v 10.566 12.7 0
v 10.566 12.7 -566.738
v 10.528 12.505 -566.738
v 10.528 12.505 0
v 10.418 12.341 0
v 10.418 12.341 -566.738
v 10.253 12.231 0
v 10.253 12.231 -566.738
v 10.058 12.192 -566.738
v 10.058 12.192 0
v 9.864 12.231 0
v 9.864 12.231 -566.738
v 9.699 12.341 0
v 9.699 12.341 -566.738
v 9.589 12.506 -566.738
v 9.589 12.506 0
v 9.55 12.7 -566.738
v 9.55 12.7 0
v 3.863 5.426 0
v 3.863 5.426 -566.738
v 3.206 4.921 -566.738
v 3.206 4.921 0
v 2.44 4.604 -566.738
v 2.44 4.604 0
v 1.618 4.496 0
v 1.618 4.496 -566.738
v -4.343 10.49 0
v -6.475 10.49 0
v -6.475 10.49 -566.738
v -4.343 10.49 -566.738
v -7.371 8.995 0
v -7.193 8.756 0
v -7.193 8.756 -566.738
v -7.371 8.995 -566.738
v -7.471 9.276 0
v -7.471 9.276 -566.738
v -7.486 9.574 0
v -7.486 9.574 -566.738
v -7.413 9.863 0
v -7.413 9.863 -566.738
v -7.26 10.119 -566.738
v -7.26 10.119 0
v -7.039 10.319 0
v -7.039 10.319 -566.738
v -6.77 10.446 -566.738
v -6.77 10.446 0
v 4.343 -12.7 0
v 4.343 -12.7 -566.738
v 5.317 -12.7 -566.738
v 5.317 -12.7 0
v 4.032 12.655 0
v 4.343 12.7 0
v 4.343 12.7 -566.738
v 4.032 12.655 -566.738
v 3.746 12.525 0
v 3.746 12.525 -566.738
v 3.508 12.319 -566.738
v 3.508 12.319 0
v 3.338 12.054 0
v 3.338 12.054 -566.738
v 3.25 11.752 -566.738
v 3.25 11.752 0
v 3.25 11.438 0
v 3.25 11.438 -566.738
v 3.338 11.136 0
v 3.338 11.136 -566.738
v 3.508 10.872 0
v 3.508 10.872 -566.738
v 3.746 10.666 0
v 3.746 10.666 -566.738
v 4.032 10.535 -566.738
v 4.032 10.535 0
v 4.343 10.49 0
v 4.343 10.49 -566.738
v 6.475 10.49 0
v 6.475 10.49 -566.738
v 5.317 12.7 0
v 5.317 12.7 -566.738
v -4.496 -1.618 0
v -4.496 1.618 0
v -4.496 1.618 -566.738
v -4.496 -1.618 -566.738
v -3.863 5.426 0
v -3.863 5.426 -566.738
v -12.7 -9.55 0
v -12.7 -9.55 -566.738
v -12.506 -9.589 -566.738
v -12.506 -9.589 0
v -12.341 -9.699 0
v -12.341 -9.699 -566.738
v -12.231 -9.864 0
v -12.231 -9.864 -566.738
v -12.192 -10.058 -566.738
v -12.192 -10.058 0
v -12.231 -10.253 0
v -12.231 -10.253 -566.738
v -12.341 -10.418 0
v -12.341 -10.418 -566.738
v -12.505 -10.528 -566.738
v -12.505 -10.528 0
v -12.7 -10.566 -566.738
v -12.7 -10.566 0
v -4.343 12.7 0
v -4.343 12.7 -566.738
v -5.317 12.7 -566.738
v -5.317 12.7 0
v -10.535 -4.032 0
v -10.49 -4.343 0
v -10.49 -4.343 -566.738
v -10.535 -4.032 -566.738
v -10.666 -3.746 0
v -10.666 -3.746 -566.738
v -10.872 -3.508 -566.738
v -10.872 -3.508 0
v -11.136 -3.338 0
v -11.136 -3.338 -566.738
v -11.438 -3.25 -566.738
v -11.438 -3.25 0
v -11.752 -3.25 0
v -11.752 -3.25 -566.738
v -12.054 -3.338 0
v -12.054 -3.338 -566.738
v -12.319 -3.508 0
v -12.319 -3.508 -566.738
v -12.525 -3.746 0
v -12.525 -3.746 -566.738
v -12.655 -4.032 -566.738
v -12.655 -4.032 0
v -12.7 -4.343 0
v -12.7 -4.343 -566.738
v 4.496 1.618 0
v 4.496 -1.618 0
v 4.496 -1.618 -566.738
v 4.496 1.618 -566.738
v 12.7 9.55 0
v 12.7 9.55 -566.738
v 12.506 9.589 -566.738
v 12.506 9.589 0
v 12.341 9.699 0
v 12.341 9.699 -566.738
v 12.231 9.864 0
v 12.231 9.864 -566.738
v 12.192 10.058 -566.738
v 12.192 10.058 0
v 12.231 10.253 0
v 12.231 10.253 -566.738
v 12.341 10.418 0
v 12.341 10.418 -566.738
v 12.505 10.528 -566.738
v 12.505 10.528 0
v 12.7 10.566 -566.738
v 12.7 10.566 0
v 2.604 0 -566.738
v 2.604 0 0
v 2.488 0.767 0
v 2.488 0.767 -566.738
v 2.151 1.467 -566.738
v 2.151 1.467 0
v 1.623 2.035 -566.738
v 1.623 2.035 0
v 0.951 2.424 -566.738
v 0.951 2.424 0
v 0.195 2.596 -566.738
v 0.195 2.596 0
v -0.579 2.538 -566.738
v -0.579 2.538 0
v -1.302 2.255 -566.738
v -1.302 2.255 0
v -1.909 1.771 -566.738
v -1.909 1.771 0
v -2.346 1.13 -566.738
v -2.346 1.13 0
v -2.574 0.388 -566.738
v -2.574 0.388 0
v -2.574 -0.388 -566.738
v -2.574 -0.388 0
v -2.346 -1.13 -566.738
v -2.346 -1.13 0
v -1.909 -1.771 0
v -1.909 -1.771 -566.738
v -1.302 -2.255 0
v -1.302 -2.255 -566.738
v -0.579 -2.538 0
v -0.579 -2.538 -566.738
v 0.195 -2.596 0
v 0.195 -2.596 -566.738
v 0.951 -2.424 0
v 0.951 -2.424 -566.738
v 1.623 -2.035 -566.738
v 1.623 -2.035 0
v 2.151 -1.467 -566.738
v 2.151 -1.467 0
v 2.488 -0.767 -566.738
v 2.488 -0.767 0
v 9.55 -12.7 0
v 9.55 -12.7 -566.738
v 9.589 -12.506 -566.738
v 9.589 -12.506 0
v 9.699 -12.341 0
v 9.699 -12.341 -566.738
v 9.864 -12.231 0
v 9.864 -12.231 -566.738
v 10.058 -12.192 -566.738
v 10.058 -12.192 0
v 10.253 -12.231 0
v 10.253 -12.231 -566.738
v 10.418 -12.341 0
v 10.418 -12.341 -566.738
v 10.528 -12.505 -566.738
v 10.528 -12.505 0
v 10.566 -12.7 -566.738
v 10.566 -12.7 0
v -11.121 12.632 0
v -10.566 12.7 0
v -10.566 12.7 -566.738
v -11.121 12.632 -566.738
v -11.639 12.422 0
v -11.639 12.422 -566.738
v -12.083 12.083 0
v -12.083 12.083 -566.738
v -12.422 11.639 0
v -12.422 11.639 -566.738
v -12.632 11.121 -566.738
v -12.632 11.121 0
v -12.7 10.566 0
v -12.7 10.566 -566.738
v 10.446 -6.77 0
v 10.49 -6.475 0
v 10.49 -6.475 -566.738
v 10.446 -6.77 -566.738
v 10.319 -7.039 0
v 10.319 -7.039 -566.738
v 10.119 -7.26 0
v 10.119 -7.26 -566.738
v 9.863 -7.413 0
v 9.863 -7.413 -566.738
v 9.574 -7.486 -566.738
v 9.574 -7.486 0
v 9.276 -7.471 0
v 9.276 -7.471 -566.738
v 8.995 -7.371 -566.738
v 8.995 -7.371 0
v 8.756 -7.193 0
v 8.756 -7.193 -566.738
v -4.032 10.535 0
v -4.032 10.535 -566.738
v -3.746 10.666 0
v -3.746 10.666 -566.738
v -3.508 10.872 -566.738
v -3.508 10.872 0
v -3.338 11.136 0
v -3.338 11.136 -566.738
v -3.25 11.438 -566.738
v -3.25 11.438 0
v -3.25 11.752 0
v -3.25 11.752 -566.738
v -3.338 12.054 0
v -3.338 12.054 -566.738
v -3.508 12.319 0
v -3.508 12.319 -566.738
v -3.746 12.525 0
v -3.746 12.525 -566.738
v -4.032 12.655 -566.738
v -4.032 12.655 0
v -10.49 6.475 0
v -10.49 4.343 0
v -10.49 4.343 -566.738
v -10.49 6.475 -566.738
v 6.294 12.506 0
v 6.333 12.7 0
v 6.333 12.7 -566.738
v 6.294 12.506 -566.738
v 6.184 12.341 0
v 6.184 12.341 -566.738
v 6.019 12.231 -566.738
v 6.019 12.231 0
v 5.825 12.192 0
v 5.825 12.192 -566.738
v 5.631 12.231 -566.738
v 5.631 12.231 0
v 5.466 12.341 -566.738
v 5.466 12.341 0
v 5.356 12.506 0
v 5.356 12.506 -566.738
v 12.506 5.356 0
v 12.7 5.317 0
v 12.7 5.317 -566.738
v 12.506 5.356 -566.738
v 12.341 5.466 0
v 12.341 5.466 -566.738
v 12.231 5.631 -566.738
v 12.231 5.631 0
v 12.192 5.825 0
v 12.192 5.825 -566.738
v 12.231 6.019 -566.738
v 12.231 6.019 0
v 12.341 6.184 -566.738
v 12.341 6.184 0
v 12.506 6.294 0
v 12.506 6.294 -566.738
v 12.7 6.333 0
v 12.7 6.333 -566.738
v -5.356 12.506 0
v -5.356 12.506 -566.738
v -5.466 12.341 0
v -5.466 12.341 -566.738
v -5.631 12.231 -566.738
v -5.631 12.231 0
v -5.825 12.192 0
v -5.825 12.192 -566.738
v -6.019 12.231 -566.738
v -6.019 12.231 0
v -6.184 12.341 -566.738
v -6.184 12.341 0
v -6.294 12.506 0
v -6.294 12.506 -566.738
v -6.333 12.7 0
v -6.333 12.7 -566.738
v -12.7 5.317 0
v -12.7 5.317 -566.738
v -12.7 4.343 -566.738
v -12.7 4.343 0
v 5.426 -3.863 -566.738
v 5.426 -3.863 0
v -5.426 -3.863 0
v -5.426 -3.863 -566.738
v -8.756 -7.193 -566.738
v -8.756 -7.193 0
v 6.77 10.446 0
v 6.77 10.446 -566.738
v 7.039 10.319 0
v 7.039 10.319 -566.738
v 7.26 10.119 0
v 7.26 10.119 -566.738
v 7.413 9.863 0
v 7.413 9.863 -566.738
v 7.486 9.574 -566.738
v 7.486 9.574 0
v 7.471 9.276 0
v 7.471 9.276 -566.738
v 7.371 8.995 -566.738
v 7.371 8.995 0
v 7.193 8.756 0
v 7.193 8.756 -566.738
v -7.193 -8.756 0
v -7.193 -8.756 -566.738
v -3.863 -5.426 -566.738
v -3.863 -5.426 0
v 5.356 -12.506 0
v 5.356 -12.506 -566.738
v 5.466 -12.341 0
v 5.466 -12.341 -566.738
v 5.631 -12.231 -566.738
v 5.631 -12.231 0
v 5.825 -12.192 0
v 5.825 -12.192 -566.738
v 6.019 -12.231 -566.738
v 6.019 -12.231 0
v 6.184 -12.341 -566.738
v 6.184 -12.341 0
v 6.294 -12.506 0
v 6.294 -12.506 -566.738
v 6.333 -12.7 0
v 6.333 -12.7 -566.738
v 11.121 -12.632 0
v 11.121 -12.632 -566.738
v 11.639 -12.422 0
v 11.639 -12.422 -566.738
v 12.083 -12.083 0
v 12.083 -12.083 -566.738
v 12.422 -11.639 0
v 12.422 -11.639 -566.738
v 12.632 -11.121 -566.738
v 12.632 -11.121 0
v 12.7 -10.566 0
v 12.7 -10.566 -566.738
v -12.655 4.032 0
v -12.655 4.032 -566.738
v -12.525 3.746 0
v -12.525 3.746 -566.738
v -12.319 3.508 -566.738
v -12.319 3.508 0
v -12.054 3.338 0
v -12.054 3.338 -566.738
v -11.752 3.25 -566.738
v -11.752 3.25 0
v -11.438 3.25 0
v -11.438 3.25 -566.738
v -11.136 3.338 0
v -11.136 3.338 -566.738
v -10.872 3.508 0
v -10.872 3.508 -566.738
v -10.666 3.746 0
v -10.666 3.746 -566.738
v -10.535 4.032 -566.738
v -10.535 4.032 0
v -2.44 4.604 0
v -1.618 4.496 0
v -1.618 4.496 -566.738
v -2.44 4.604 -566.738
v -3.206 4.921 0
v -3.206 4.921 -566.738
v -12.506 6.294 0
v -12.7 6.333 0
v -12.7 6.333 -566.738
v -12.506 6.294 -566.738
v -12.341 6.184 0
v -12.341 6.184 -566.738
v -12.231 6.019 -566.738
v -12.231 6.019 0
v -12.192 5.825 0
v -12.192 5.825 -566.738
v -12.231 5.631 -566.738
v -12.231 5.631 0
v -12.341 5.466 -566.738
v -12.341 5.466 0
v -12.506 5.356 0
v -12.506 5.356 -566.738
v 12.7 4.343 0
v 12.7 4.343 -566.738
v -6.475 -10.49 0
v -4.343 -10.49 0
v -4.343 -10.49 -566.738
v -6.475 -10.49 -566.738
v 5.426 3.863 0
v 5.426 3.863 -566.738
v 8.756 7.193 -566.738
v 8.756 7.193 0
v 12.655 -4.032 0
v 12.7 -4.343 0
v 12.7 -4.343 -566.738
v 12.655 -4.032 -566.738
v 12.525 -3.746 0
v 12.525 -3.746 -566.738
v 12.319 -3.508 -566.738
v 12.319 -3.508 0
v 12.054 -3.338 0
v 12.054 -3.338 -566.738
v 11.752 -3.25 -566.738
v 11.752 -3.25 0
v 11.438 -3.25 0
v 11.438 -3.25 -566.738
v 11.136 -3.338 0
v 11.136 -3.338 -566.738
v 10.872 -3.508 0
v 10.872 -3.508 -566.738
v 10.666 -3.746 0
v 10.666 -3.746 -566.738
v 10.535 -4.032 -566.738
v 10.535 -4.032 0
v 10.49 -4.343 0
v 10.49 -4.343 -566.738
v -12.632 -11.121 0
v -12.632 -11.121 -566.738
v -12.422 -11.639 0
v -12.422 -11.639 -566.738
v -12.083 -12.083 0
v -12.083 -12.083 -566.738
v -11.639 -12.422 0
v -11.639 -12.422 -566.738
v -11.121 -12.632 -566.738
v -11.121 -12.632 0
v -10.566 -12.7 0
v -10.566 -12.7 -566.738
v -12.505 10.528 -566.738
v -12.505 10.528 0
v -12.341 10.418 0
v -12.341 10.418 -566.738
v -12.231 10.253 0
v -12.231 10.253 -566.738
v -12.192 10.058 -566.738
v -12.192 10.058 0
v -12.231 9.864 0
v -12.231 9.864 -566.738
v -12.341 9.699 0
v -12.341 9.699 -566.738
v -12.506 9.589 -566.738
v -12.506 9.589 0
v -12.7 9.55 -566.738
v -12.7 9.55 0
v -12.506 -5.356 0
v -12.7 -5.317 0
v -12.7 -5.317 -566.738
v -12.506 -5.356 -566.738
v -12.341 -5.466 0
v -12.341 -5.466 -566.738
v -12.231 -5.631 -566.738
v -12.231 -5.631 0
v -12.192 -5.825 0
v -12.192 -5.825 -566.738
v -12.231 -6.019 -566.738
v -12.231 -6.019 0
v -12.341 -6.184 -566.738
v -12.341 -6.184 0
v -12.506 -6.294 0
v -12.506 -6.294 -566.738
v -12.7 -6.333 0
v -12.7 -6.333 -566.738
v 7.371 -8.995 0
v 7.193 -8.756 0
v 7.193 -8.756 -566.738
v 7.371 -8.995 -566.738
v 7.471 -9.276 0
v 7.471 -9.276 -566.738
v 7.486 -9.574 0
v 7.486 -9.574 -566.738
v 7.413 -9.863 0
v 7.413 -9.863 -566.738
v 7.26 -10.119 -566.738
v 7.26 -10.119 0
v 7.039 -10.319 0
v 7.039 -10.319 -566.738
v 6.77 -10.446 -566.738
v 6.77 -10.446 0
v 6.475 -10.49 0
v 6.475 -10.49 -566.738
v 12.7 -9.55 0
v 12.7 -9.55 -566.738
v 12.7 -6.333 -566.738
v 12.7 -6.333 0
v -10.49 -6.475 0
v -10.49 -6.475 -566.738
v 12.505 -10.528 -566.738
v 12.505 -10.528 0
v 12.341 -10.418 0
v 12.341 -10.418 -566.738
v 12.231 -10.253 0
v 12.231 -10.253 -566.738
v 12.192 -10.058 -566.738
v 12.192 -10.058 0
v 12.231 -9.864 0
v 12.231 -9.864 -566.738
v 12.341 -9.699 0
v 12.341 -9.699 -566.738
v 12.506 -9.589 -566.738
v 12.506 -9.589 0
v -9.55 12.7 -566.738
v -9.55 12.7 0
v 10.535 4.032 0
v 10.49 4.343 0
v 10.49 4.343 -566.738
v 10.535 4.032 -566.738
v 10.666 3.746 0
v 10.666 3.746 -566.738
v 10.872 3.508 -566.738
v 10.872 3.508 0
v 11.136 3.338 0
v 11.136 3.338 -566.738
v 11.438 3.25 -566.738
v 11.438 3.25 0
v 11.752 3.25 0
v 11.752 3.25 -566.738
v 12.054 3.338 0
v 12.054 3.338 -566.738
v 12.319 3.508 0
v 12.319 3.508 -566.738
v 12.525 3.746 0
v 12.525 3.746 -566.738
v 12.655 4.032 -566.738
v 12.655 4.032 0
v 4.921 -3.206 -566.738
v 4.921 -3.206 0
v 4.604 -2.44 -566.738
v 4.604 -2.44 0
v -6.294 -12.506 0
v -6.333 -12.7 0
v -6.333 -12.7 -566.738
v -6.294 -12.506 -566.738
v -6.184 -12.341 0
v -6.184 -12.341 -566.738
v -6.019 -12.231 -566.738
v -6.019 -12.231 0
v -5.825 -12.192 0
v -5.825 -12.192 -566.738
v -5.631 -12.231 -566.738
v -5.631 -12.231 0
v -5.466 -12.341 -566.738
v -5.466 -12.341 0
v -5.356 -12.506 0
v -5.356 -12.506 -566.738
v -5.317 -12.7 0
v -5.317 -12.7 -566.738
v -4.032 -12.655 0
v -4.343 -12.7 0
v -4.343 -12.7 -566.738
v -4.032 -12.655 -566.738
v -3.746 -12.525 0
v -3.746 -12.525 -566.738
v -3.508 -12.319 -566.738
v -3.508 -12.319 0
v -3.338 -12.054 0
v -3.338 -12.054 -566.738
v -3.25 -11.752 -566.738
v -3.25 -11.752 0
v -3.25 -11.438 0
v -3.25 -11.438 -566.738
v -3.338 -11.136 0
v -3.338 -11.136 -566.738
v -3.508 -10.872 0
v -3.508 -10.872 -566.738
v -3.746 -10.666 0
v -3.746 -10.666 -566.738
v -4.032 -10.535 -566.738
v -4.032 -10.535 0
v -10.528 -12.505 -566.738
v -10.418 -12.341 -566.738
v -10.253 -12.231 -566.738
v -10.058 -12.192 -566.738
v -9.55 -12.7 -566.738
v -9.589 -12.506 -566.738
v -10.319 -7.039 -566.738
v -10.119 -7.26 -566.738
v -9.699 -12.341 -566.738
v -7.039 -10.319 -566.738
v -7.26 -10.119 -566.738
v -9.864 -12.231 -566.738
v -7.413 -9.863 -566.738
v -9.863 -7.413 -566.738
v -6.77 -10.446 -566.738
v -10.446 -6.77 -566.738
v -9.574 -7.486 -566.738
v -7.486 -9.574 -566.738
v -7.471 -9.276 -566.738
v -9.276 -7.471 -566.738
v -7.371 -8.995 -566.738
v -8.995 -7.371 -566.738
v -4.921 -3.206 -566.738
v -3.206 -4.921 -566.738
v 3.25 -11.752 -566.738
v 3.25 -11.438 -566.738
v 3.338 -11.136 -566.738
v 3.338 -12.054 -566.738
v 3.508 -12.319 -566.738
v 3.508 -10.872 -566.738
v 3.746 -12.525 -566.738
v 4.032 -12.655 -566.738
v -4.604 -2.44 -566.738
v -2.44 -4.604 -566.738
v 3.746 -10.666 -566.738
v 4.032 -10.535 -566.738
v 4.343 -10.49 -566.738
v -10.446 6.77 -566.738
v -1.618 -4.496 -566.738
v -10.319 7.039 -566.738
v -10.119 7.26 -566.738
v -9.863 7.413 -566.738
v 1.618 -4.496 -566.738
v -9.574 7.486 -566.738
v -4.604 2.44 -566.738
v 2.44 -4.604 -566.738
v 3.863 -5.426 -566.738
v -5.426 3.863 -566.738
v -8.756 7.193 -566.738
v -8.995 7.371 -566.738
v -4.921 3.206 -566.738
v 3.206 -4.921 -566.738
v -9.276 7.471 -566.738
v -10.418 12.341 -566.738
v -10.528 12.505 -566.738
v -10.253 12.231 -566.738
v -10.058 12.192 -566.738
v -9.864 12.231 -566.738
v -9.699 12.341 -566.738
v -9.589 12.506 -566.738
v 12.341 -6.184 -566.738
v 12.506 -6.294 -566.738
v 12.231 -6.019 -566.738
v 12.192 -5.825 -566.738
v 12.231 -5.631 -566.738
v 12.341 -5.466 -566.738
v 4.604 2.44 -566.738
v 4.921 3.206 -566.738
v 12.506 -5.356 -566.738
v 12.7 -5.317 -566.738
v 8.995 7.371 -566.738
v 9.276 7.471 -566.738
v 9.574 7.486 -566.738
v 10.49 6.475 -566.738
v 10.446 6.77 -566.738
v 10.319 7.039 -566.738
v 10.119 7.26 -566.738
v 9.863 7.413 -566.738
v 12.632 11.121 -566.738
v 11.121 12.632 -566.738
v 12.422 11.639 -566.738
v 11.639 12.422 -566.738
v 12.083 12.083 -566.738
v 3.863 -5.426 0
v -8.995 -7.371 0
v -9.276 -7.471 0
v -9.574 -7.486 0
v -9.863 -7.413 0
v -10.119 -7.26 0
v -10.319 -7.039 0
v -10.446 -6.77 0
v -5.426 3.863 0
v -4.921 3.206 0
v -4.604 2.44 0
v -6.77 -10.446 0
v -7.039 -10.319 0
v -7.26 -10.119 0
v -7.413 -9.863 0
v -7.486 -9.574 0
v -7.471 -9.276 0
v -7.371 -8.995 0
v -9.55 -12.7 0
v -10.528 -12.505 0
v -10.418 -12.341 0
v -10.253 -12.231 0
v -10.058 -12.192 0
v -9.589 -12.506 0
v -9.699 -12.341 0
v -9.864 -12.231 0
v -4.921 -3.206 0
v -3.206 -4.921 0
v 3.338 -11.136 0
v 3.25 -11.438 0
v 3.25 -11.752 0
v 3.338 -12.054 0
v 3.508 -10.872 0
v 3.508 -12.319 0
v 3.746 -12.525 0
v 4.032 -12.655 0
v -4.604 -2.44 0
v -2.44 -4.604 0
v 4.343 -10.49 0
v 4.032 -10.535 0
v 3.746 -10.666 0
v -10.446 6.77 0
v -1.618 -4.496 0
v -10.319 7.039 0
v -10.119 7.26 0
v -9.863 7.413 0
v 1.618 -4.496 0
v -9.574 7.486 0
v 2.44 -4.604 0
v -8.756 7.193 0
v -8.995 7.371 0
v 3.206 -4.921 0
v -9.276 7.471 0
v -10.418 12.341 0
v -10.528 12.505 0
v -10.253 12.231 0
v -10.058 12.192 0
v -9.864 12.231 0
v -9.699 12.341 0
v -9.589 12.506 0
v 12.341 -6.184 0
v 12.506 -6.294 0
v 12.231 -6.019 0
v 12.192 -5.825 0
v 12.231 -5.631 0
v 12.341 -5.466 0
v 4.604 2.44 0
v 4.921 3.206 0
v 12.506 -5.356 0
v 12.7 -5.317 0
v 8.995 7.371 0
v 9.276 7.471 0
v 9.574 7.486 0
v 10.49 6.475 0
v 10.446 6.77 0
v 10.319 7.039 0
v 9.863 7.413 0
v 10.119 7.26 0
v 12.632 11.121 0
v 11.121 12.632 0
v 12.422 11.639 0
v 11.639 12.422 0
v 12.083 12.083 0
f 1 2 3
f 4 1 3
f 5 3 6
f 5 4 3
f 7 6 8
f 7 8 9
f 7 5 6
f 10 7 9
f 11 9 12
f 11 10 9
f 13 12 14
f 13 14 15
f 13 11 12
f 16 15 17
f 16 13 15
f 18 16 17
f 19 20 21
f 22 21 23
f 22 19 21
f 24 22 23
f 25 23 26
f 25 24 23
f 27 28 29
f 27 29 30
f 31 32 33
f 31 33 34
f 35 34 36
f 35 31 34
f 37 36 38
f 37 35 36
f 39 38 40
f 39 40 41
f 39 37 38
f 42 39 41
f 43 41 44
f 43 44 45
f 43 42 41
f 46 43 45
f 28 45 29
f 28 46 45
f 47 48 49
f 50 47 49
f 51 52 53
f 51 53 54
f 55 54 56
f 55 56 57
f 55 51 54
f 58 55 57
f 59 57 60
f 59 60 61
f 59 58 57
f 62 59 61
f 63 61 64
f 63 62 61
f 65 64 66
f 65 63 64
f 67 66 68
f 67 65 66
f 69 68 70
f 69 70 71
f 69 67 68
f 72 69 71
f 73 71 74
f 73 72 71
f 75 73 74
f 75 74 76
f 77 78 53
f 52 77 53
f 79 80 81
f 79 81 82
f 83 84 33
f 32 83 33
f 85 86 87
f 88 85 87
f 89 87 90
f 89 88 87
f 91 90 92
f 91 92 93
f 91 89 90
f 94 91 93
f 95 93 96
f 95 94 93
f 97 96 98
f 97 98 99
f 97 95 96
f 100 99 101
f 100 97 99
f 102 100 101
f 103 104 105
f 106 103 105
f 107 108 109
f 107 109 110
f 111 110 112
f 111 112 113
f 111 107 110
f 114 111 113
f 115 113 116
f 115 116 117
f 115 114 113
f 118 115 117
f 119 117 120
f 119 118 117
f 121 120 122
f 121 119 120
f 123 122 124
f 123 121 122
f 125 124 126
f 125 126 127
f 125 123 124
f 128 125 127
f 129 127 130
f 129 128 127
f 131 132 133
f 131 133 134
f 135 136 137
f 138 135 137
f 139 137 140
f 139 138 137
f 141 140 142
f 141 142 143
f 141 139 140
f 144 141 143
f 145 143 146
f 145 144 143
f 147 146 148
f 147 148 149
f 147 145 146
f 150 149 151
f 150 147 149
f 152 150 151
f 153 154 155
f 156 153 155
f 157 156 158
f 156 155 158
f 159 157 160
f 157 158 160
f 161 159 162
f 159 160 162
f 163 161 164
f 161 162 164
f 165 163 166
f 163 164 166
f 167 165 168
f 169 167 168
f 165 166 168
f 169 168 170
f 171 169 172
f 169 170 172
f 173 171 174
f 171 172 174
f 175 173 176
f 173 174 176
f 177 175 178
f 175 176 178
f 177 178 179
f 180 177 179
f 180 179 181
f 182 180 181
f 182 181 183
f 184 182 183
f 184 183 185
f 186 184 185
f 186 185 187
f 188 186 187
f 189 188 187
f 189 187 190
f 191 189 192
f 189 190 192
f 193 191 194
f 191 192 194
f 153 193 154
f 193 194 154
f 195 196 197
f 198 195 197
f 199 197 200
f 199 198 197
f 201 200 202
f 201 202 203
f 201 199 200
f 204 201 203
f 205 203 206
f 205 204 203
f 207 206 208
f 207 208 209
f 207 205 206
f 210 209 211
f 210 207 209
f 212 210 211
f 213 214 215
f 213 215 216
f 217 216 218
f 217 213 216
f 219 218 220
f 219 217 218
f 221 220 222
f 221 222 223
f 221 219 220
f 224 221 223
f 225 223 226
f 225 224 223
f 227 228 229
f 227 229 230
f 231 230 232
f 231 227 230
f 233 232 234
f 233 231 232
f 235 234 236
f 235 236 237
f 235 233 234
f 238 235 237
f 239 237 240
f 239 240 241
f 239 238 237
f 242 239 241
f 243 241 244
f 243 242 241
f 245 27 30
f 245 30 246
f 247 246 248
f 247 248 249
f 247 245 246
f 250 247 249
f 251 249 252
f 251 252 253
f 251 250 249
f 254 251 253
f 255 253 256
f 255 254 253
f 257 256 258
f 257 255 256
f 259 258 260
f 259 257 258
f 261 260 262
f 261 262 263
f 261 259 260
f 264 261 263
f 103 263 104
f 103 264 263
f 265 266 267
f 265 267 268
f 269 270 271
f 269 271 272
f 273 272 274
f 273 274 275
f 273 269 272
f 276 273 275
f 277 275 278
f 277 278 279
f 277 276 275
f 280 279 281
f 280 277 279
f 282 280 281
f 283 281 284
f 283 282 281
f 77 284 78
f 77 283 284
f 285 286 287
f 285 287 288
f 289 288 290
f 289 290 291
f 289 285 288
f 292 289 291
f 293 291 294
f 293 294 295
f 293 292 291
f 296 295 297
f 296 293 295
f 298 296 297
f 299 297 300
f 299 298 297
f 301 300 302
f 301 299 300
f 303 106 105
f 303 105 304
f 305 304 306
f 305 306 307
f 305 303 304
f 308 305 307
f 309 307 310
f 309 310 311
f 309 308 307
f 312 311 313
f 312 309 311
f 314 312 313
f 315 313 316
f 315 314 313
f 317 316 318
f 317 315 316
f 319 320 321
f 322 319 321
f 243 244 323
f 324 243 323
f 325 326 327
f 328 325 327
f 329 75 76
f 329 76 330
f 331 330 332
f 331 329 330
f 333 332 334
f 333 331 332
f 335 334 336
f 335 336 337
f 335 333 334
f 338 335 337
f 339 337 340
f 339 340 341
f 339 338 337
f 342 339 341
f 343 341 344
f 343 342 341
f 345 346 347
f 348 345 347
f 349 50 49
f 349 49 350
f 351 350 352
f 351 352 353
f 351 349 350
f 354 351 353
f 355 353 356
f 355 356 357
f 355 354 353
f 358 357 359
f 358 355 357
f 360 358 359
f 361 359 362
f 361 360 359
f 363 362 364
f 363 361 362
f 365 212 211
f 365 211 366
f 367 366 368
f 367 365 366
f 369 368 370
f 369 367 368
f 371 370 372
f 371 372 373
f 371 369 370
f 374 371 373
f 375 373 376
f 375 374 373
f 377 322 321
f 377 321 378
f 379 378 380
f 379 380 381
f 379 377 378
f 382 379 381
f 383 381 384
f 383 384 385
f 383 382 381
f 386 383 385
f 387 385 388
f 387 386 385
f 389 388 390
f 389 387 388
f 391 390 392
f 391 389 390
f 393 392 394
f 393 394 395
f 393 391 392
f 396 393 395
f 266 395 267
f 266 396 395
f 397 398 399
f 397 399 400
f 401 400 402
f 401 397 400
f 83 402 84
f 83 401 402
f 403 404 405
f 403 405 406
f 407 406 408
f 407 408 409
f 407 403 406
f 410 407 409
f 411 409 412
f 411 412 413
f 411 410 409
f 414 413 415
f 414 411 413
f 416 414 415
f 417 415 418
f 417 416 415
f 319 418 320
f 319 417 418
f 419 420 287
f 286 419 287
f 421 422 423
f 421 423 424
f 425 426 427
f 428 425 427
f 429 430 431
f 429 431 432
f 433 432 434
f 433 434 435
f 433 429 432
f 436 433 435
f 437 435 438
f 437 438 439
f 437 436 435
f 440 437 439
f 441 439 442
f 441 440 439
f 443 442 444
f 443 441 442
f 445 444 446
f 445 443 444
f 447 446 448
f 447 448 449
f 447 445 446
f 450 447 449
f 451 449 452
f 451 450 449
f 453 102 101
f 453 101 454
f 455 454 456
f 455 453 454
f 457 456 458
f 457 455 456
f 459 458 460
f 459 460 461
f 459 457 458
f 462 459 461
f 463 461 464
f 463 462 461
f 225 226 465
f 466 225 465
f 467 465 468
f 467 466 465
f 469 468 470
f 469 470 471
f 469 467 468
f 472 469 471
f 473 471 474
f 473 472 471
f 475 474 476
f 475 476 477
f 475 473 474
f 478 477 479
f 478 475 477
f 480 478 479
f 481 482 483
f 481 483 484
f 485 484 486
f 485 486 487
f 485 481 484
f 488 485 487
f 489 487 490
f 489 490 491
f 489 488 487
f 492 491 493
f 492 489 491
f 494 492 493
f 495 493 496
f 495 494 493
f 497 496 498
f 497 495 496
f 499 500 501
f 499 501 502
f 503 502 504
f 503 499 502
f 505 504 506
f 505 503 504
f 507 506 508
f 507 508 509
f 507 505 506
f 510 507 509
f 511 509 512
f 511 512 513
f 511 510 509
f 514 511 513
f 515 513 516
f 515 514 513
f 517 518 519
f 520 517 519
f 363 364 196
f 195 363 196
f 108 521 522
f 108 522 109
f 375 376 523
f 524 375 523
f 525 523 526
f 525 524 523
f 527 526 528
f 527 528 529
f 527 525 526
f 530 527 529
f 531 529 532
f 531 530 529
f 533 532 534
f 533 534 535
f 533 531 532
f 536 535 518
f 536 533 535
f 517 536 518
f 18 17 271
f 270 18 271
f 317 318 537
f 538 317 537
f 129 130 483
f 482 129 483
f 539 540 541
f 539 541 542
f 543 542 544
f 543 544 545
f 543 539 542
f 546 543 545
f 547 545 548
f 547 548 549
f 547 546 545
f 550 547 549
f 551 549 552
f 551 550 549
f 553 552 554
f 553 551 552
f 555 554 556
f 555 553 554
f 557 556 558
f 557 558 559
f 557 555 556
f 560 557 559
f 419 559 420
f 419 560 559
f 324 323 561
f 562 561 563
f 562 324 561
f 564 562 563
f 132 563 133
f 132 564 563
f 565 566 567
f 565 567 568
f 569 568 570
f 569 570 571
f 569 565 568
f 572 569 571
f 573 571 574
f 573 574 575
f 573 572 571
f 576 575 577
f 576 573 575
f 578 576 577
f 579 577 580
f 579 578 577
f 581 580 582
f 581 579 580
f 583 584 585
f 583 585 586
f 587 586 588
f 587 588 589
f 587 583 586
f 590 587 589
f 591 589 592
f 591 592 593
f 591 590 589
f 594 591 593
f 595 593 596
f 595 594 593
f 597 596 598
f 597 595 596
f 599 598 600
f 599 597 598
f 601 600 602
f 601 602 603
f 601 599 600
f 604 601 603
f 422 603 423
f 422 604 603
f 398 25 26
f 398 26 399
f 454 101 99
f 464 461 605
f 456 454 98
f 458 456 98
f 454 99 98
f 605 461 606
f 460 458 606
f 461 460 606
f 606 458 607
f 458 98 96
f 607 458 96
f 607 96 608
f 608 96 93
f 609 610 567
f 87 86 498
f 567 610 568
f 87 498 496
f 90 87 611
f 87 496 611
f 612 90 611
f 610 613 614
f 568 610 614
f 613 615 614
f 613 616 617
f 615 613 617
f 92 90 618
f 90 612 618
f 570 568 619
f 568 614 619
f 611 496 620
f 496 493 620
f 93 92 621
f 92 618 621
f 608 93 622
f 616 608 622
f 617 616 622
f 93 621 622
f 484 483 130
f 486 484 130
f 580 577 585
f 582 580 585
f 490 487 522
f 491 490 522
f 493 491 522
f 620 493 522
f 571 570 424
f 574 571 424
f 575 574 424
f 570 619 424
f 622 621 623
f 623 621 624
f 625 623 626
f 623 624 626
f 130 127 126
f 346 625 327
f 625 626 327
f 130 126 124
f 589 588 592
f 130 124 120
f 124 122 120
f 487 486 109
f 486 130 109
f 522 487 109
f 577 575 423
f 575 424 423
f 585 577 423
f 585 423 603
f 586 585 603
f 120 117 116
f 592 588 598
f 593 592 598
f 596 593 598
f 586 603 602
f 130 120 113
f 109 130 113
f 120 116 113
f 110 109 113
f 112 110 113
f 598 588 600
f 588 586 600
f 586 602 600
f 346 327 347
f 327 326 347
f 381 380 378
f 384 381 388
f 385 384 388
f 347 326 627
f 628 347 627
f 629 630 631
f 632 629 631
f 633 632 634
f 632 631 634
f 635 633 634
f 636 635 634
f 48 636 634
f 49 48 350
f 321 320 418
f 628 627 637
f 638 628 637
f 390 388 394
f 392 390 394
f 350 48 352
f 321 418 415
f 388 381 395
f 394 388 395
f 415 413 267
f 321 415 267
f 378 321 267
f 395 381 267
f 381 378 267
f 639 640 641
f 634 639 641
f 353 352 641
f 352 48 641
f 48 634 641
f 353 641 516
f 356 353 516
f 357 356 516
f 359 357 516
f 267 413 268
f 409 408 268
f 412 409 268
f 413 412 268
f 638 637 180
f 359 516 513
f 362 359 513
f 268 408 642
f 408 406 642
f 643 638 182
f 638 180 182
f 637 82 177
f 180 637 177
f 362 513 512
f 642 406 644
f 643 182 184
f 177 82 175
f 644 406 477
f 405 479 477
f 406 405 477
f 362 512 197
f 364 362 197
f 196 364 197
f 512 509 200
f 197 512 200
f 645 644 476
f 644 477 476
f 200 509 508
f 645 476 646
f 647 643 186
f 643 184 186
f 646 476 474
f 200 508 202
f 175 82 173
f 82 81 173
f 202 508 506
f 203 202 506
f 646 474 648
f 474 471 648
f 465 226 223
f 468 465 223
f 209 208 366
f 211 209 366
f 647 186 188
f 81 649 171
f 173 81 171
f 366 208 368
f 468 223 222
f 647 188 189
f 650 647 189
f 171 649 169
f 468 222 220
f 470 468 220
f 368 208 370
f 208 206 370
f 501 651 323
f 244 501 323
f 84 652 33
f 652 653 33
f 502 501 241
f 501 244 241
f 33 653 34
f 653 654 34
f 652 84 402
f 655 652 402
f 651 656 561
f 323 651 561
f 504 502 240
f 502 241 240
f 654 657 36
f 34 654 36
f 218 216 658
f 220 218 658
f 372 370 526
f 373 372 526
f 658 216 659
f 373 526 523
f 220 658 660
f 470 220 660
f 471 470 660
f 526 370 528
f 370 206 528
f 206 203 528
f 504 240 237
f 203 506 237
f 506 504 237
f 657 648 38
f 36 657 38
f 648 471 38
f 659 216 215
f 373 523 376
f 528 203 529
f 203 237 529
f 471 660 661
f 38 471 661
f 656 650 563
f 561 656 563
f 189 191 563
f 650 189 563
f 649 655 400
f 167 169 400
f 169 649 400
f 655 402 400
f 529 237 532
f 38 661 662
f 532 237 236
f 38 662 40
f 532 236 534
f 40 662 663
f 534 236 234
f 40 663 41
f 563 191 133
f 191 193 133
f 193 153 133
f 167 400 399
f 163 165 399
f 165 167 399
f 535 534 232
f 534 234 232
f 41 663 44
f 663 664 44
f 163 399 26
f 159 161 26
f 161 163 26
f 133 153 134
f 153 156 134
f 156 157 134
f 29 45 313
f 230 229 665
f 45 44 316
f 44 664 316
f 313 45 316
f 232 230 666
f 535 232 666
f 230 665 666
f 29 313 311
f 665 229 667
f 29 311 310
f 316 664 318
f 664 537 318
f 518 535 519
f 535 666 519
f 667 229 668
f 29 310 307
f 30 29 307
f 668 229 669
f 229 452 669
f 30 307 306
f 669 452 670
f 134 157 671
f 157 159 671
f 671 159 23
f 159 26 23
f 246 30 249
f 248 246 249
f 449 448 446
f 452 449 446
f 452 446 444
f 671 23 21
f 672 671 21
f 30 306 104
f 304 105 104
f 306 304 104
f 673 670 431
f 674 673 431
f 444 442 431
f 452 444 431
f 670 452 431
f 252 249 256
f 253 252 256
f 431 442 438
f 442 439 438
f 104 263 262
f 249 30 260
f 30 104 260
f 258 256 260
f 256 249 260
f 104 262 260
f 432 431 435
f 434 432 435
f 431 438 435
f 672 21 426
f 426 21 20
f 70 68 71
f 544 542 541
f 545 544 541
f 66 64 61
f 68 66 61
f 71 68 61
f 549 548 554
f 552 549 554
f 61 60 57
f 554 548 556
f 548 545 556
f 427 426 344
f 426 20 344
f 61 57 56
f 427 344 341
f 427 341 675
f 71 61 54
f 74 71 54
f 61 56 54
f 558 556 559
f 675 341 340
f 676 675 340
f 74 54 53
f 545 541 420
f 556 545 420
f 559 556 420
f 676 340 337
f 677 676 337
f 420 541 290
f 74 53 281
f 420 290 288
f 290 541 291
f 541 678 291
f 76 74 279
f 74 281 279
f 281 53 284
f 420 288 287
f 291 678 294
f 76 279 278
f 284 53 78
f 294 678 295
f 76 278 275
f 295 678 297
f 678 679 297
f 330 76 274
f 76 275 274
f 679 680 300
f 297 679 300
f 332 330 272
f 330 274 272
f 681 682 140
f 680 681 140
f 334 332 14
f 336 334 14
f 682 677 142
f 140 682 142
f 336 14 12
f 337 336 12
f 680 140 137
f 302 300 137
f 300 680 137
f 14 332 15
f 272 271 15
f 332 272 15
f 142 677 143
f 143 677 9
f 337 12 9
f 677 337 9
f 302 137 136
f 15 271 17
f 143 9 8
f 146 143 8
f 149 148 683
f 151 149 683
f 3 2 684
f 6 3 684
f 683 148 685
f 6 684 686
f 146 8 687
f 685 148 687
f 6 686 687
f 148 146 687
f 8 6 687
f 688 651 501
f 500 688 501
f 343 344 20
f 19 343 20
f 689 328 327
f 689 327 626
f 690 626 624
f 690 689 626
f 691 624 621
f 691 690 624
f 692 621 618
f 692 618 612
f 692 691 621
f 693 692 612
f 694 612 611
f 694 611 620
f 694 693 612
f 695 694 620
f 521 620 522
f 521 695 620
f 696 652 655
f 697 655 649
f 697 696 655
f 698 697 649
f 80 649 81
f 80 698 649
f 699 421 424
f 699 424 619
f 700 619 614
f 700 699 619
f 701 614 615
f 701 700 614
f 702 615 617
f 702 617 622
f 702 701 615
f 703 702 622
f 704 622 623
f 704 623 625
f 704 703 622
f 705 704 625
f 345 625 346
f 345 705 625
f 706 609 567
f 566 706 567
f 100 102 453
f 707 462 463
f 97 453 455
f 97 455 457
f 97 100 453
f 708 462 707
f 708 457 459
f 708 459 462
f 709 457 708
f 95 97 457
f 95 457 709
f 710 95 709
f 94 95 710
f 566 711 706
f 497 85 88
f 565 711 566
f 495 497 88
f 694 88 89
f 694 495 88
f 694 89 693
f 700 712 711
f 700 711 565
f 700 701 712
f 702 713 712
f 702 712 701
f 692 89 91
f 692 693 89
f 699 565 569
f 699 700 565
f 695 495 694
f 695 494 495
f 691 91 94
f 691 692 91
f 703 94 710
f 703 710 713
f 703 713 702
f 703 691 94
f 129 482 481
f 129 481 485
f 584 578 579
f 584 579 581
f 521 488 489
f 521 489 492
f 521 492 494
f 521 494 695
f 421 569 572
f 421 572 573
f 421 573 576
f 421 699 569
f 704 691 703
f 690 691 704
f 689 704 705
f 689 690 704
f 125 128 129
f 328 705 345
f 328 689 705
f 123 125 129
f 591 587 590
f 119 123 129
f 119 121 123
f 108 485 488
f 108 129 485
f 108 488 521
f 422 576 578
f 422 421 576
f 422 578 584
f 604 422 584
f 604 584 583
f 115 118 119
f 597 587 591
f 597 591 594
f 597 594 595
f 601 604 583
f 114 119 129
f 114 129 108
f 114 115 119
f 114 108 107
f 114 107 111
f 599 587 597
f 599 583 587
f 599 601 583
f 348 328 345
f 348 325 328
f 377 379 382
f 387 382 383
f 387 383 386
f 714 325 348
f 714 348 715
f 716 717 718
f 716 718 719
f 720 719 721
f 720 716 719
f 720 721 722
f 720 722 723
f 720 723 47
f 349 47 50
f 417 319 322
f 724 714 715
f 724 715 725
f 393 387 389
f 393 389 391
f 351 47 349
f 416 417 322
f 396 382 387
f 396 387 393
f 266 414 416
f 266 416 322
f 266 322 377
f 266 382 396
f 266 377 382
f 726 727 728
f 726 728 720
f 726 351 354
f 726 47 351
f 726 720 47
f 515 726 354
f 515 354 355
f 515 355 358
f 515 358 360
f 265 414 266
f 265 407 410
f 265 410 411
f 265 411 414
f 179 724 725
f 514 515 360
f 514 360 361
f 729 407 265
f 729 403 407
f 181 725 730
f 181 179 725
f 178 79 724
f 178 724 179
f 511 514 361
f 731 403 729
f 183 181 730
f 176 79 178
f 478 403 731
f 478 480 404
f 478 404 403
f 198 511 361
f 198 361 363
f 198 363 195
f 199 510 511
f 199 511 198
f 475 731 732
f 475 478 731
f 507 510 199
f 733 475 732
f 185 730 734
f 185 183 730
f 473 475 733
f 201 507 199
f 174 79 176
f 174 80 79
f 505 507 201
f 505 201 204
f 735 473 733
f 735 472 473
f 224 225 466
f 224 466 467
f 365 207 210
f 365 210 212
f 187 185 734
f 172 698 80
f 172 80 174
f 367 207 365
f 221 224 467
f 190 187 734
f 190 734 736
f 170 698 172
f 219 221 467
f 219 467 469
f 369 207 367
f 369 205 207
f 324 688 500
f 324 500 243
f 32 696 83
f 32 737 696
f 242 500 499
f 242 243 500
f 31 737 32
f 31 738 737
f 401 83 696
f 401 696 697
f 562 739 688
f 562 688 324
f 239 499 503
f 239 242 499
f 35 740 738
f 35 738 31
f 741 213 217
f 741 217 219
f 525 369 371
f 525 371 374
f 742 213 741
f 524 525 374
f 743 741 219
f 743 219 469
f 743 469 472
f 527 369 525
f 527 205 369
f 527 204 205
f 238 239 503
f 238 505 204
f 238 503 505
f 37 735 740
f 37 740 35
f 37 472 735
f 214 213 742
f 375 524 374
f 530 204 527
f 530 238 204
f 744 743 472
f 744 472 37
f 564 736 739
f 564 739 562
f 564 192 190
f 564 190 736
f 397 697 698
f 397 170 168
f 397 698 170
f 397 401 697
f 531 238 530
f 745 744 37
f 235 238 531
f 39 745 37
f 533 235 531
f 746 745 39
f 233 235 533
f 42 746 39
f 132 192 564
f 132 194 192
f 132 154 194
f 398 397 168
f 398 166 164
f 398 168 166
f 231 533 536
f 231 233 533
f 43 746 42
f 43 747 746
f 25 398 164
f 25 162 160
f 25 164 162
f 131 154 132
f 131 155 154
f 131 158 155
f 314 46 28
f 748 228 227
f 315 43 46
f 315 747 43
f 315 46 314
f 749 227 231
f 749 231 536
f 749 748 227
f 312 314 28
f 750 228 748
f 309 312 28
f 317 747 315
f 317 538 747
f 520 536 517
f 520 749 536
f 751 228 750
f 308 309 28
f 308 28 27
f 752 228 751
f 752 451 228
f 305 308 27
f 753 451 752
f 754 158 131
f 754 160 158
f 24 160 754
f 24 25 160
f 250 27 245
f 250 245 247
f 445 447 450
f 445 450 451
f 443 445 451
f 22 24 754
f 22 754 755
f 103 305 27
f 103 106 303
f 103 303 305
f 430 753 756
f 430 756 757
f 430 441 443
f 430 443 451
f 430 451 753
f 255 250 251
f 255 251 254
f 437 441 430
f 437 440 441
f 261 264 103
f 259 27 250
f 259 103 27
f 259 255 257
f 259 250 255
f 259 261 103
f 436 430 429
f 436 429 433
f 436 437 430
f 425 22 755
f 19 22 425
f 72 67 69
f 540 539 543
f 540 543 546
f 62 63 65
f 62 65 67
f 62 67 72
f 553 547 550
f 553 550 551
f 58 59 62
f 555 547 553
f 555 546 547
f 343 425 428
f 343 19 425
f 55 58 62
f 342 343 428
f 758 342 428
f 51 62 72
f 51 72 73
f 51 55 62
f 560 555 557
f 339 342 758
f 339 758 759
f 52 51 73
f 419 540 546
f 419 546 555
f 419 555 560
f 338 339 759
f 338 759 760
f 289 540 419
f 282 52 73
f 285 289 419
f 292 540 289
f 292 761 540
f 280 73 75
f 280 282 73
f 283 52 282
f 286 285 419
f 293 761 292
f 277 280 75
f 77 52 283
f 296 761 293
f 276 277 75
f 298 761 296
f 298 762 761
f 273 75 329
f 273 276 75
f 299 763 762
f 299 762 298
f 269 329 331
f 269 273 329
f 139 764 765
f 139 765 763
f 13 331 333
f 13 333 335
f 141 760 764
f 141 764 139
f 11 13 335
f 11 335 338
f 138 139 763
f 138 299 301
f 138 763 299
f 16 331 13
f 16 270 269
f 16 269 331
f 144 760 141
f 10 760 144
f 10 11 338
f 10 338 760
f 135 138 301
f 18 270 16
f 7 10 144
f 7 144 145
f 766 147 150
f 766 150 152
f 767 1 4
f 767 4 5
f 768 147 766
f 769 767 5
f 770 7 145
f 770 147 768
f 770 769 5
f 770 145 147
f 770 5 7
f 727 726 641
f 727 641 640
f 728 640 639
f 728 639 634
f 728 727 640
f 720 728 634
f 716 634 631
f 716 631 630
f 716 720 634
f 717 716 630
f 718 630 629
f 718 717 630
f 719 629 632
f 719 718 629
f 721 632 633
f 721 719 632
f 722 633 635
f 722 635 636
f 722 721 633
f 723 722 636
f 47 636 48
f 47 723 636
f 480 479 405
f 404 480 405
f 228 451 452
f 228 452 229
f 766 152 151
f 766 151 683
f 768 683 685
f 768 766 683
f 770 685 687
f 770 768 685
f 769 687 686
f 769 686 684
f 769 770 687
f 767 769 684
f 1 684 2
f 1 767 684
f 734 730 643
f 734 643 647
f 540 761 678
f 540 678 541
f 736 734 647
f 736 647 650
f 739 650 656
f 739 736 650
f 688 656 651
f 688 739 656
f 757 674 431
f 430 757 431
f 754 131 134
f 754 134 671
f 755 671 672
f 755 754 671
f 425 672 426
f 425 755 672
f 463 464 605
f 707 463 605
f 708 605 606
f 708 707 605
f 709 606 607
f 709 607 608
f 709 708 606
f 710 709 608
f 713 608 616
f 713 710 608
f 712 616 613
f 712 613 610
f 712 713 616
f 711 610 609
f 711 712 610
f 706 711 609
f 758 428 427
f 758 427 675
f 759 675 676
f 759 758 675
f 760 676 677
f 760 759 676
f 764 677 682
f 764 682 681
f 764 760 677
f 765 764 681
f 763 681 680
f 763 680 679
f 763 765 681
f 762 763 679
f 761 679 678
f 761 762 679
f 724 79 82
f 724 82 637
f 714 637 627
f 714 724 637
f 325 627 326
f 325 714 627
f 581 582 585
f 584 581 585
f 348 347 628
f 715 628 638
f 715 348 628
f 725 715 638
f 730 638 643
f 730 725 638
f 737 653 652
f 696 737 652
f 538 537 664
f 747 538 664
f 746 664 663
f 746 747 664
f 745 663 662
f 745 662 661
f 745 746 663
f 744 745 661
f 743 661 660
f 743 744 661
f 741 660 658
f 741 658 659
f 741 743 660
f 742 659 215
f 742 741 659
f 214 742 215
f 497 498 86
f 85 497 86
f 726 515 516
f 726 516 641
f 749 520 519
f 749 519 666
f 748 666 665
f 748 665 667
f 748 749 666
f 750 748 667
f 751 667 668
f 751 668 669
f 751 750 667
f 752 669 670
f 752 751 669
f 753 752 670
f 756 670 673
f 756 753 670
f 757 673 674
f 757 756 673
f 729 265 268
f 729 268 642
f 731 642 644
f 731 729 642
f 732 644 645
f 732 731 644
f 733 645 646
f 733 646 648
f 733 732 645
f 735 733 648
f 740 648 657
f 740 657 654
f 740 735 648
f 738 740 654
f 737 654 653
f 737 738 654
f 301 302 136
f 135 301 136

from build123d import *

# Parameters (mm, degrees)
SKETCH1_R           = 2.6035
BOSS_EXTRUDE1_DEPTH = 566.7375


with BuildPart() as part:
    # Sketch1 → Boss-Extrude1 (new body)
    with BuildSketch(Plane.XY):
        with BuildLine():
            Line((-12.7, -6.3330836), (-12.7, -9.5504))
            ThreePointArc((-12.7, -9.5504), (-12.192000006, -10.058323491), (-12.699846982, -10.566399977))
            ThreePointArc((-12.699846982, -10.566399977), (-12.082522516, -12.082522516), (-10.566399977, -12.699846982))
            ThreePointArc((-10.566399977, -12.699846982), (-10.058323491, -12.192000006), (-9.5504, -12.7))
            Line((-9.5504, -12.7), (-6.3330836, -12.7))
            ThreePointArc((-6.3330836, -12.7), (-5.8250836, -12.192), (-5.3170836, -12.7))
            Line((-5.3170836, -12.7), (-4.343399971, -12.7))
            ThreePointArc((-4.343399971, -12.7), (-3.238499971, -11.5951), (-4.343399971, -10.4902))
            Line((-4.343399971, -10.4902), (-6.474794456, -10.4902))
            ThreePointArc((-6.474794456, -10.4902), (-7.413456061, -9.863006367), (-7.193214945, -8.75577951))
            Line((-7.193214945, -8.75577951), (-3.863171405, -5.42573597))
            ThreePointArc((-3.863171405, -5.42573597), (-2.833127272, -4.737482484), (-1.618107374, -4.4958))
            Line((-1.618107374, -4.4958), (1.618107374, -4.4958))
            ThreePointArc((1.618107374, -4.4958), (2.833127272, -4.737482484), (3.863171405, -5.42573597))
            Line((3.863171405, -5.42573597), (7.193214945, -8.75577951))
            ThreePointArc((7.193214945, -8.75577951), (7.413456061, -9.863006367), (6.474794456, -10.4902))
            Line((6.474794456, -10.4902), (4.3434, -10.4902))
            ThreePointArc((4.3434, -10.4902), (3.2385, -11.5951), (4.3434, -12.7))
            Line((4.3434, -12.7), (5.3170836, -12.7))
            ThreePointArc((5.3170836, -12.7), (5.8250836, -12.192), (6.3330836, -12.7))
            Line((6.3330836, -12.7), (9.5504, -12.7))
            ThreePointArc((9.5504, -12.7), (10.058323491, -12.192000006), (10.566399977, -12.699846982))
            ThreePointArc((10.566399977, -12.699846982), (12.082522516, -12.082522516), (12.699846982, -10.566399977))
            ThreePointArc((12.699846982, -10.566399977), (12.192000006, -10.058323491), (12.7, -9.5504))
            Line((12.7, -9.5504), (12.7, -6.3330836))
            ThreePointArc((12.7, -6.3330836), (12.192, -5.8250836), (12.7, -5.3170836))
            Line((12.7, -5.3170836), (12.7, -4.343399971))
            ThreePointArc((12.7, -4.343399971), (11.5951, -3.238499971), (10.4902, -4.343399971))
            Line((10.4902, -4.343399971), (10.4902, -6.474794456))
            ThreePointArc((10.4902, -6.474794456), (9.863006367, -7.413456061), (8.75577951, -7.193214945))
            Line((8.75577951, -7.193214945), (5.42573597, -3.863171405))
            ThreePointArc((5.42573597, -3.863171405), (4.737482484, -2.833127272), (4.4958, -1.618107374))
            Line((4.4958, -1.618107374), (4.4958, 1.618107374))
            ThreePointArc((4.4958, 1.618107374), (4.737482484, 2.833127272), (5.42573597, 3.863171405))
            Line((5.42573597, 3.863171405), (8.75577951, 7.193214945))
            ThreePointArc((8.75577951, 7.193214945), (9.863006367, 7.413456061), (10.4902, 6.474794456))
            Line((10.4902, 6.474794456), (10.4902, 4.3434))
            ThreePointArc((10.4902, 4.3434), (11.5951, 3.2385), (12.7, 4.3434))
            Line((12.7, 4.3434), (12.7, 5.3170836))
            ThreePointArc((12.7, 5.3170836), (12.192, 5.8250836), (12.7, 6.3330836))
            Line((12.7, 6.3330836), (12.7, 9.5504))
            ThreePointArc((12.7, 9.5504), (12.192000006, 10.058323491), (12.699846982, 10.566399977))
            ThreePointArc((12.699846982, 10.566399977), (12.082522516, 12.082522516), (10.566399977, 12.699846982))
            ThreePointArc((10.566399977, 12.699846982), (10.058323491, 12.192000006), (9.5504, 12.7))
            Line((9.5504, 12.7), (6.3330836, 12.7))
            ThreePointArc((6.3330836, 12.7), (5.8250836, 12.192), (5.3170836, 12.7))
            Line((5.3170836, 12.7), (4.343399971, 12.7))
            ThreePointArc((4.343399971, 12.7), (3.238499971, 11.5951), (4.343399971, 10.4902))
            Line((4.343399971, 10.4902), (6.474794456, 10.4902))
            ThreePointArc((6.474794456, 10.4902), (7.413456061, 9.863006367), (7.193214945, 8.75577951))
            Line((7.193214945, 8.75577951), (3.863171405, 5.42573597))
            ThreePointArc((3.863171405, 5.42573597), (2.833127272, 4.737482484), (1.618107374, 4.4958))
            Line((1.618107374, 4.4958), (-1.618107374, 4.4958))
            ThreePointArc((-1.618107374, 4.4958), (-2.833127272, 4.737482484), (-3.863171405, 5.42573597))
            Line((-3.863171405, 5.42573597), (-7.193214945, 8.75577951))
            ThreePointArc((-7.193214945, 8.75577951), (-7.413456061, 9.863006367), (-6.474794456, 10.4902))
            Line((-6.474794456, 10.4902), (-4.3434, 10.4902))
            ThreePointArc((-4.3434, 10.4902), (-3.2385, 11.5951), (-4.3434, 12.7))
            Line((-4.3434, 12.7), (-5.3170836, 12.7))
            ThreePointArc((-5.3170836, 12.7), (-5.8250836, 12.192), (-6.3330836, 12.7))
            Line((-6.3330836, 12.7), (-9.5504, 12.7))
            ThreePointArc((-9.5504, 12.7), (-10.058323491, 12.192000006), (-10.566399977, 12.699846982))
            ThreePointArc((-10.566399977, 12.699846982), (-12.082522516, 12.082522516), (-12.699846982, 10.566399977))
            ThreePointArc((-12.699846982, 10.566399977), (-12.192000006, 10.058323491), (-12.7, 9.5504))
            Line((-12.7, 9.5504), (-12.7, 6.3330836))
            ThreePointArc((-12.7, 6.3330836), (-12.192, 5.8250836), (-12.7, 5.3170836))
            Line((-12.7, 5.3170836), (-12.7, 4.343399971))
            ThreePointArc((-12.7, 4.343399971), (-11.5951, 3.238499971), (-10.4902, 4.343399971))
            Line((-10.4902, 4.343399971), (-10.4902, 6.474794456))
            ThreePointArc((-10.4902, 6.474794456), (-9.863006367, 7.413456061), (-8.75577951, 7.193214945))
            Line((-8.75577951, 7.193214945), (-5.42573597, 3.863171405))
            ThreePointArc((-5.42573597, 3.863171405), (-4.737482484, 2.833127272), (-4.4958, 1.618107374))
            Line((-4.4958, 1.618107374), (-4.4958, -1.618107374))
            ThreePointArc((-4.4958, -1.618107374), (-4.737482484, -2.833127272), (-5.42573597, -3.863171405))
            Line((-5.42573597, -3.863171405), (-8.75577951, -7.193214945))
            ThreePointArc((-8.75577951, -7.193214945), (-9.863006367, -7.413456061), (-10.4902, -6.474794456))
            Line((-10.4902, -6.474794456), (-10.4902, -4.3434))
            ThreePointArc((-10.4902, -4.3434), (-11.5951, -3.2385), (-12.7, -4.3434))
            Line((-12.7, -4.3434), (-12.7, -5.3170836))
            ThreePointArc((-12.7, -5.3170836), (-12.192, -5.8250836), (-12.7, -6.3330836))
        make_face()
        Circle(SKETCH1_R, mode=Mode.SUBTRACT)
    extrude(amount=-BOSS_EXTRUDE1_DEPTH)


solid = part.part
